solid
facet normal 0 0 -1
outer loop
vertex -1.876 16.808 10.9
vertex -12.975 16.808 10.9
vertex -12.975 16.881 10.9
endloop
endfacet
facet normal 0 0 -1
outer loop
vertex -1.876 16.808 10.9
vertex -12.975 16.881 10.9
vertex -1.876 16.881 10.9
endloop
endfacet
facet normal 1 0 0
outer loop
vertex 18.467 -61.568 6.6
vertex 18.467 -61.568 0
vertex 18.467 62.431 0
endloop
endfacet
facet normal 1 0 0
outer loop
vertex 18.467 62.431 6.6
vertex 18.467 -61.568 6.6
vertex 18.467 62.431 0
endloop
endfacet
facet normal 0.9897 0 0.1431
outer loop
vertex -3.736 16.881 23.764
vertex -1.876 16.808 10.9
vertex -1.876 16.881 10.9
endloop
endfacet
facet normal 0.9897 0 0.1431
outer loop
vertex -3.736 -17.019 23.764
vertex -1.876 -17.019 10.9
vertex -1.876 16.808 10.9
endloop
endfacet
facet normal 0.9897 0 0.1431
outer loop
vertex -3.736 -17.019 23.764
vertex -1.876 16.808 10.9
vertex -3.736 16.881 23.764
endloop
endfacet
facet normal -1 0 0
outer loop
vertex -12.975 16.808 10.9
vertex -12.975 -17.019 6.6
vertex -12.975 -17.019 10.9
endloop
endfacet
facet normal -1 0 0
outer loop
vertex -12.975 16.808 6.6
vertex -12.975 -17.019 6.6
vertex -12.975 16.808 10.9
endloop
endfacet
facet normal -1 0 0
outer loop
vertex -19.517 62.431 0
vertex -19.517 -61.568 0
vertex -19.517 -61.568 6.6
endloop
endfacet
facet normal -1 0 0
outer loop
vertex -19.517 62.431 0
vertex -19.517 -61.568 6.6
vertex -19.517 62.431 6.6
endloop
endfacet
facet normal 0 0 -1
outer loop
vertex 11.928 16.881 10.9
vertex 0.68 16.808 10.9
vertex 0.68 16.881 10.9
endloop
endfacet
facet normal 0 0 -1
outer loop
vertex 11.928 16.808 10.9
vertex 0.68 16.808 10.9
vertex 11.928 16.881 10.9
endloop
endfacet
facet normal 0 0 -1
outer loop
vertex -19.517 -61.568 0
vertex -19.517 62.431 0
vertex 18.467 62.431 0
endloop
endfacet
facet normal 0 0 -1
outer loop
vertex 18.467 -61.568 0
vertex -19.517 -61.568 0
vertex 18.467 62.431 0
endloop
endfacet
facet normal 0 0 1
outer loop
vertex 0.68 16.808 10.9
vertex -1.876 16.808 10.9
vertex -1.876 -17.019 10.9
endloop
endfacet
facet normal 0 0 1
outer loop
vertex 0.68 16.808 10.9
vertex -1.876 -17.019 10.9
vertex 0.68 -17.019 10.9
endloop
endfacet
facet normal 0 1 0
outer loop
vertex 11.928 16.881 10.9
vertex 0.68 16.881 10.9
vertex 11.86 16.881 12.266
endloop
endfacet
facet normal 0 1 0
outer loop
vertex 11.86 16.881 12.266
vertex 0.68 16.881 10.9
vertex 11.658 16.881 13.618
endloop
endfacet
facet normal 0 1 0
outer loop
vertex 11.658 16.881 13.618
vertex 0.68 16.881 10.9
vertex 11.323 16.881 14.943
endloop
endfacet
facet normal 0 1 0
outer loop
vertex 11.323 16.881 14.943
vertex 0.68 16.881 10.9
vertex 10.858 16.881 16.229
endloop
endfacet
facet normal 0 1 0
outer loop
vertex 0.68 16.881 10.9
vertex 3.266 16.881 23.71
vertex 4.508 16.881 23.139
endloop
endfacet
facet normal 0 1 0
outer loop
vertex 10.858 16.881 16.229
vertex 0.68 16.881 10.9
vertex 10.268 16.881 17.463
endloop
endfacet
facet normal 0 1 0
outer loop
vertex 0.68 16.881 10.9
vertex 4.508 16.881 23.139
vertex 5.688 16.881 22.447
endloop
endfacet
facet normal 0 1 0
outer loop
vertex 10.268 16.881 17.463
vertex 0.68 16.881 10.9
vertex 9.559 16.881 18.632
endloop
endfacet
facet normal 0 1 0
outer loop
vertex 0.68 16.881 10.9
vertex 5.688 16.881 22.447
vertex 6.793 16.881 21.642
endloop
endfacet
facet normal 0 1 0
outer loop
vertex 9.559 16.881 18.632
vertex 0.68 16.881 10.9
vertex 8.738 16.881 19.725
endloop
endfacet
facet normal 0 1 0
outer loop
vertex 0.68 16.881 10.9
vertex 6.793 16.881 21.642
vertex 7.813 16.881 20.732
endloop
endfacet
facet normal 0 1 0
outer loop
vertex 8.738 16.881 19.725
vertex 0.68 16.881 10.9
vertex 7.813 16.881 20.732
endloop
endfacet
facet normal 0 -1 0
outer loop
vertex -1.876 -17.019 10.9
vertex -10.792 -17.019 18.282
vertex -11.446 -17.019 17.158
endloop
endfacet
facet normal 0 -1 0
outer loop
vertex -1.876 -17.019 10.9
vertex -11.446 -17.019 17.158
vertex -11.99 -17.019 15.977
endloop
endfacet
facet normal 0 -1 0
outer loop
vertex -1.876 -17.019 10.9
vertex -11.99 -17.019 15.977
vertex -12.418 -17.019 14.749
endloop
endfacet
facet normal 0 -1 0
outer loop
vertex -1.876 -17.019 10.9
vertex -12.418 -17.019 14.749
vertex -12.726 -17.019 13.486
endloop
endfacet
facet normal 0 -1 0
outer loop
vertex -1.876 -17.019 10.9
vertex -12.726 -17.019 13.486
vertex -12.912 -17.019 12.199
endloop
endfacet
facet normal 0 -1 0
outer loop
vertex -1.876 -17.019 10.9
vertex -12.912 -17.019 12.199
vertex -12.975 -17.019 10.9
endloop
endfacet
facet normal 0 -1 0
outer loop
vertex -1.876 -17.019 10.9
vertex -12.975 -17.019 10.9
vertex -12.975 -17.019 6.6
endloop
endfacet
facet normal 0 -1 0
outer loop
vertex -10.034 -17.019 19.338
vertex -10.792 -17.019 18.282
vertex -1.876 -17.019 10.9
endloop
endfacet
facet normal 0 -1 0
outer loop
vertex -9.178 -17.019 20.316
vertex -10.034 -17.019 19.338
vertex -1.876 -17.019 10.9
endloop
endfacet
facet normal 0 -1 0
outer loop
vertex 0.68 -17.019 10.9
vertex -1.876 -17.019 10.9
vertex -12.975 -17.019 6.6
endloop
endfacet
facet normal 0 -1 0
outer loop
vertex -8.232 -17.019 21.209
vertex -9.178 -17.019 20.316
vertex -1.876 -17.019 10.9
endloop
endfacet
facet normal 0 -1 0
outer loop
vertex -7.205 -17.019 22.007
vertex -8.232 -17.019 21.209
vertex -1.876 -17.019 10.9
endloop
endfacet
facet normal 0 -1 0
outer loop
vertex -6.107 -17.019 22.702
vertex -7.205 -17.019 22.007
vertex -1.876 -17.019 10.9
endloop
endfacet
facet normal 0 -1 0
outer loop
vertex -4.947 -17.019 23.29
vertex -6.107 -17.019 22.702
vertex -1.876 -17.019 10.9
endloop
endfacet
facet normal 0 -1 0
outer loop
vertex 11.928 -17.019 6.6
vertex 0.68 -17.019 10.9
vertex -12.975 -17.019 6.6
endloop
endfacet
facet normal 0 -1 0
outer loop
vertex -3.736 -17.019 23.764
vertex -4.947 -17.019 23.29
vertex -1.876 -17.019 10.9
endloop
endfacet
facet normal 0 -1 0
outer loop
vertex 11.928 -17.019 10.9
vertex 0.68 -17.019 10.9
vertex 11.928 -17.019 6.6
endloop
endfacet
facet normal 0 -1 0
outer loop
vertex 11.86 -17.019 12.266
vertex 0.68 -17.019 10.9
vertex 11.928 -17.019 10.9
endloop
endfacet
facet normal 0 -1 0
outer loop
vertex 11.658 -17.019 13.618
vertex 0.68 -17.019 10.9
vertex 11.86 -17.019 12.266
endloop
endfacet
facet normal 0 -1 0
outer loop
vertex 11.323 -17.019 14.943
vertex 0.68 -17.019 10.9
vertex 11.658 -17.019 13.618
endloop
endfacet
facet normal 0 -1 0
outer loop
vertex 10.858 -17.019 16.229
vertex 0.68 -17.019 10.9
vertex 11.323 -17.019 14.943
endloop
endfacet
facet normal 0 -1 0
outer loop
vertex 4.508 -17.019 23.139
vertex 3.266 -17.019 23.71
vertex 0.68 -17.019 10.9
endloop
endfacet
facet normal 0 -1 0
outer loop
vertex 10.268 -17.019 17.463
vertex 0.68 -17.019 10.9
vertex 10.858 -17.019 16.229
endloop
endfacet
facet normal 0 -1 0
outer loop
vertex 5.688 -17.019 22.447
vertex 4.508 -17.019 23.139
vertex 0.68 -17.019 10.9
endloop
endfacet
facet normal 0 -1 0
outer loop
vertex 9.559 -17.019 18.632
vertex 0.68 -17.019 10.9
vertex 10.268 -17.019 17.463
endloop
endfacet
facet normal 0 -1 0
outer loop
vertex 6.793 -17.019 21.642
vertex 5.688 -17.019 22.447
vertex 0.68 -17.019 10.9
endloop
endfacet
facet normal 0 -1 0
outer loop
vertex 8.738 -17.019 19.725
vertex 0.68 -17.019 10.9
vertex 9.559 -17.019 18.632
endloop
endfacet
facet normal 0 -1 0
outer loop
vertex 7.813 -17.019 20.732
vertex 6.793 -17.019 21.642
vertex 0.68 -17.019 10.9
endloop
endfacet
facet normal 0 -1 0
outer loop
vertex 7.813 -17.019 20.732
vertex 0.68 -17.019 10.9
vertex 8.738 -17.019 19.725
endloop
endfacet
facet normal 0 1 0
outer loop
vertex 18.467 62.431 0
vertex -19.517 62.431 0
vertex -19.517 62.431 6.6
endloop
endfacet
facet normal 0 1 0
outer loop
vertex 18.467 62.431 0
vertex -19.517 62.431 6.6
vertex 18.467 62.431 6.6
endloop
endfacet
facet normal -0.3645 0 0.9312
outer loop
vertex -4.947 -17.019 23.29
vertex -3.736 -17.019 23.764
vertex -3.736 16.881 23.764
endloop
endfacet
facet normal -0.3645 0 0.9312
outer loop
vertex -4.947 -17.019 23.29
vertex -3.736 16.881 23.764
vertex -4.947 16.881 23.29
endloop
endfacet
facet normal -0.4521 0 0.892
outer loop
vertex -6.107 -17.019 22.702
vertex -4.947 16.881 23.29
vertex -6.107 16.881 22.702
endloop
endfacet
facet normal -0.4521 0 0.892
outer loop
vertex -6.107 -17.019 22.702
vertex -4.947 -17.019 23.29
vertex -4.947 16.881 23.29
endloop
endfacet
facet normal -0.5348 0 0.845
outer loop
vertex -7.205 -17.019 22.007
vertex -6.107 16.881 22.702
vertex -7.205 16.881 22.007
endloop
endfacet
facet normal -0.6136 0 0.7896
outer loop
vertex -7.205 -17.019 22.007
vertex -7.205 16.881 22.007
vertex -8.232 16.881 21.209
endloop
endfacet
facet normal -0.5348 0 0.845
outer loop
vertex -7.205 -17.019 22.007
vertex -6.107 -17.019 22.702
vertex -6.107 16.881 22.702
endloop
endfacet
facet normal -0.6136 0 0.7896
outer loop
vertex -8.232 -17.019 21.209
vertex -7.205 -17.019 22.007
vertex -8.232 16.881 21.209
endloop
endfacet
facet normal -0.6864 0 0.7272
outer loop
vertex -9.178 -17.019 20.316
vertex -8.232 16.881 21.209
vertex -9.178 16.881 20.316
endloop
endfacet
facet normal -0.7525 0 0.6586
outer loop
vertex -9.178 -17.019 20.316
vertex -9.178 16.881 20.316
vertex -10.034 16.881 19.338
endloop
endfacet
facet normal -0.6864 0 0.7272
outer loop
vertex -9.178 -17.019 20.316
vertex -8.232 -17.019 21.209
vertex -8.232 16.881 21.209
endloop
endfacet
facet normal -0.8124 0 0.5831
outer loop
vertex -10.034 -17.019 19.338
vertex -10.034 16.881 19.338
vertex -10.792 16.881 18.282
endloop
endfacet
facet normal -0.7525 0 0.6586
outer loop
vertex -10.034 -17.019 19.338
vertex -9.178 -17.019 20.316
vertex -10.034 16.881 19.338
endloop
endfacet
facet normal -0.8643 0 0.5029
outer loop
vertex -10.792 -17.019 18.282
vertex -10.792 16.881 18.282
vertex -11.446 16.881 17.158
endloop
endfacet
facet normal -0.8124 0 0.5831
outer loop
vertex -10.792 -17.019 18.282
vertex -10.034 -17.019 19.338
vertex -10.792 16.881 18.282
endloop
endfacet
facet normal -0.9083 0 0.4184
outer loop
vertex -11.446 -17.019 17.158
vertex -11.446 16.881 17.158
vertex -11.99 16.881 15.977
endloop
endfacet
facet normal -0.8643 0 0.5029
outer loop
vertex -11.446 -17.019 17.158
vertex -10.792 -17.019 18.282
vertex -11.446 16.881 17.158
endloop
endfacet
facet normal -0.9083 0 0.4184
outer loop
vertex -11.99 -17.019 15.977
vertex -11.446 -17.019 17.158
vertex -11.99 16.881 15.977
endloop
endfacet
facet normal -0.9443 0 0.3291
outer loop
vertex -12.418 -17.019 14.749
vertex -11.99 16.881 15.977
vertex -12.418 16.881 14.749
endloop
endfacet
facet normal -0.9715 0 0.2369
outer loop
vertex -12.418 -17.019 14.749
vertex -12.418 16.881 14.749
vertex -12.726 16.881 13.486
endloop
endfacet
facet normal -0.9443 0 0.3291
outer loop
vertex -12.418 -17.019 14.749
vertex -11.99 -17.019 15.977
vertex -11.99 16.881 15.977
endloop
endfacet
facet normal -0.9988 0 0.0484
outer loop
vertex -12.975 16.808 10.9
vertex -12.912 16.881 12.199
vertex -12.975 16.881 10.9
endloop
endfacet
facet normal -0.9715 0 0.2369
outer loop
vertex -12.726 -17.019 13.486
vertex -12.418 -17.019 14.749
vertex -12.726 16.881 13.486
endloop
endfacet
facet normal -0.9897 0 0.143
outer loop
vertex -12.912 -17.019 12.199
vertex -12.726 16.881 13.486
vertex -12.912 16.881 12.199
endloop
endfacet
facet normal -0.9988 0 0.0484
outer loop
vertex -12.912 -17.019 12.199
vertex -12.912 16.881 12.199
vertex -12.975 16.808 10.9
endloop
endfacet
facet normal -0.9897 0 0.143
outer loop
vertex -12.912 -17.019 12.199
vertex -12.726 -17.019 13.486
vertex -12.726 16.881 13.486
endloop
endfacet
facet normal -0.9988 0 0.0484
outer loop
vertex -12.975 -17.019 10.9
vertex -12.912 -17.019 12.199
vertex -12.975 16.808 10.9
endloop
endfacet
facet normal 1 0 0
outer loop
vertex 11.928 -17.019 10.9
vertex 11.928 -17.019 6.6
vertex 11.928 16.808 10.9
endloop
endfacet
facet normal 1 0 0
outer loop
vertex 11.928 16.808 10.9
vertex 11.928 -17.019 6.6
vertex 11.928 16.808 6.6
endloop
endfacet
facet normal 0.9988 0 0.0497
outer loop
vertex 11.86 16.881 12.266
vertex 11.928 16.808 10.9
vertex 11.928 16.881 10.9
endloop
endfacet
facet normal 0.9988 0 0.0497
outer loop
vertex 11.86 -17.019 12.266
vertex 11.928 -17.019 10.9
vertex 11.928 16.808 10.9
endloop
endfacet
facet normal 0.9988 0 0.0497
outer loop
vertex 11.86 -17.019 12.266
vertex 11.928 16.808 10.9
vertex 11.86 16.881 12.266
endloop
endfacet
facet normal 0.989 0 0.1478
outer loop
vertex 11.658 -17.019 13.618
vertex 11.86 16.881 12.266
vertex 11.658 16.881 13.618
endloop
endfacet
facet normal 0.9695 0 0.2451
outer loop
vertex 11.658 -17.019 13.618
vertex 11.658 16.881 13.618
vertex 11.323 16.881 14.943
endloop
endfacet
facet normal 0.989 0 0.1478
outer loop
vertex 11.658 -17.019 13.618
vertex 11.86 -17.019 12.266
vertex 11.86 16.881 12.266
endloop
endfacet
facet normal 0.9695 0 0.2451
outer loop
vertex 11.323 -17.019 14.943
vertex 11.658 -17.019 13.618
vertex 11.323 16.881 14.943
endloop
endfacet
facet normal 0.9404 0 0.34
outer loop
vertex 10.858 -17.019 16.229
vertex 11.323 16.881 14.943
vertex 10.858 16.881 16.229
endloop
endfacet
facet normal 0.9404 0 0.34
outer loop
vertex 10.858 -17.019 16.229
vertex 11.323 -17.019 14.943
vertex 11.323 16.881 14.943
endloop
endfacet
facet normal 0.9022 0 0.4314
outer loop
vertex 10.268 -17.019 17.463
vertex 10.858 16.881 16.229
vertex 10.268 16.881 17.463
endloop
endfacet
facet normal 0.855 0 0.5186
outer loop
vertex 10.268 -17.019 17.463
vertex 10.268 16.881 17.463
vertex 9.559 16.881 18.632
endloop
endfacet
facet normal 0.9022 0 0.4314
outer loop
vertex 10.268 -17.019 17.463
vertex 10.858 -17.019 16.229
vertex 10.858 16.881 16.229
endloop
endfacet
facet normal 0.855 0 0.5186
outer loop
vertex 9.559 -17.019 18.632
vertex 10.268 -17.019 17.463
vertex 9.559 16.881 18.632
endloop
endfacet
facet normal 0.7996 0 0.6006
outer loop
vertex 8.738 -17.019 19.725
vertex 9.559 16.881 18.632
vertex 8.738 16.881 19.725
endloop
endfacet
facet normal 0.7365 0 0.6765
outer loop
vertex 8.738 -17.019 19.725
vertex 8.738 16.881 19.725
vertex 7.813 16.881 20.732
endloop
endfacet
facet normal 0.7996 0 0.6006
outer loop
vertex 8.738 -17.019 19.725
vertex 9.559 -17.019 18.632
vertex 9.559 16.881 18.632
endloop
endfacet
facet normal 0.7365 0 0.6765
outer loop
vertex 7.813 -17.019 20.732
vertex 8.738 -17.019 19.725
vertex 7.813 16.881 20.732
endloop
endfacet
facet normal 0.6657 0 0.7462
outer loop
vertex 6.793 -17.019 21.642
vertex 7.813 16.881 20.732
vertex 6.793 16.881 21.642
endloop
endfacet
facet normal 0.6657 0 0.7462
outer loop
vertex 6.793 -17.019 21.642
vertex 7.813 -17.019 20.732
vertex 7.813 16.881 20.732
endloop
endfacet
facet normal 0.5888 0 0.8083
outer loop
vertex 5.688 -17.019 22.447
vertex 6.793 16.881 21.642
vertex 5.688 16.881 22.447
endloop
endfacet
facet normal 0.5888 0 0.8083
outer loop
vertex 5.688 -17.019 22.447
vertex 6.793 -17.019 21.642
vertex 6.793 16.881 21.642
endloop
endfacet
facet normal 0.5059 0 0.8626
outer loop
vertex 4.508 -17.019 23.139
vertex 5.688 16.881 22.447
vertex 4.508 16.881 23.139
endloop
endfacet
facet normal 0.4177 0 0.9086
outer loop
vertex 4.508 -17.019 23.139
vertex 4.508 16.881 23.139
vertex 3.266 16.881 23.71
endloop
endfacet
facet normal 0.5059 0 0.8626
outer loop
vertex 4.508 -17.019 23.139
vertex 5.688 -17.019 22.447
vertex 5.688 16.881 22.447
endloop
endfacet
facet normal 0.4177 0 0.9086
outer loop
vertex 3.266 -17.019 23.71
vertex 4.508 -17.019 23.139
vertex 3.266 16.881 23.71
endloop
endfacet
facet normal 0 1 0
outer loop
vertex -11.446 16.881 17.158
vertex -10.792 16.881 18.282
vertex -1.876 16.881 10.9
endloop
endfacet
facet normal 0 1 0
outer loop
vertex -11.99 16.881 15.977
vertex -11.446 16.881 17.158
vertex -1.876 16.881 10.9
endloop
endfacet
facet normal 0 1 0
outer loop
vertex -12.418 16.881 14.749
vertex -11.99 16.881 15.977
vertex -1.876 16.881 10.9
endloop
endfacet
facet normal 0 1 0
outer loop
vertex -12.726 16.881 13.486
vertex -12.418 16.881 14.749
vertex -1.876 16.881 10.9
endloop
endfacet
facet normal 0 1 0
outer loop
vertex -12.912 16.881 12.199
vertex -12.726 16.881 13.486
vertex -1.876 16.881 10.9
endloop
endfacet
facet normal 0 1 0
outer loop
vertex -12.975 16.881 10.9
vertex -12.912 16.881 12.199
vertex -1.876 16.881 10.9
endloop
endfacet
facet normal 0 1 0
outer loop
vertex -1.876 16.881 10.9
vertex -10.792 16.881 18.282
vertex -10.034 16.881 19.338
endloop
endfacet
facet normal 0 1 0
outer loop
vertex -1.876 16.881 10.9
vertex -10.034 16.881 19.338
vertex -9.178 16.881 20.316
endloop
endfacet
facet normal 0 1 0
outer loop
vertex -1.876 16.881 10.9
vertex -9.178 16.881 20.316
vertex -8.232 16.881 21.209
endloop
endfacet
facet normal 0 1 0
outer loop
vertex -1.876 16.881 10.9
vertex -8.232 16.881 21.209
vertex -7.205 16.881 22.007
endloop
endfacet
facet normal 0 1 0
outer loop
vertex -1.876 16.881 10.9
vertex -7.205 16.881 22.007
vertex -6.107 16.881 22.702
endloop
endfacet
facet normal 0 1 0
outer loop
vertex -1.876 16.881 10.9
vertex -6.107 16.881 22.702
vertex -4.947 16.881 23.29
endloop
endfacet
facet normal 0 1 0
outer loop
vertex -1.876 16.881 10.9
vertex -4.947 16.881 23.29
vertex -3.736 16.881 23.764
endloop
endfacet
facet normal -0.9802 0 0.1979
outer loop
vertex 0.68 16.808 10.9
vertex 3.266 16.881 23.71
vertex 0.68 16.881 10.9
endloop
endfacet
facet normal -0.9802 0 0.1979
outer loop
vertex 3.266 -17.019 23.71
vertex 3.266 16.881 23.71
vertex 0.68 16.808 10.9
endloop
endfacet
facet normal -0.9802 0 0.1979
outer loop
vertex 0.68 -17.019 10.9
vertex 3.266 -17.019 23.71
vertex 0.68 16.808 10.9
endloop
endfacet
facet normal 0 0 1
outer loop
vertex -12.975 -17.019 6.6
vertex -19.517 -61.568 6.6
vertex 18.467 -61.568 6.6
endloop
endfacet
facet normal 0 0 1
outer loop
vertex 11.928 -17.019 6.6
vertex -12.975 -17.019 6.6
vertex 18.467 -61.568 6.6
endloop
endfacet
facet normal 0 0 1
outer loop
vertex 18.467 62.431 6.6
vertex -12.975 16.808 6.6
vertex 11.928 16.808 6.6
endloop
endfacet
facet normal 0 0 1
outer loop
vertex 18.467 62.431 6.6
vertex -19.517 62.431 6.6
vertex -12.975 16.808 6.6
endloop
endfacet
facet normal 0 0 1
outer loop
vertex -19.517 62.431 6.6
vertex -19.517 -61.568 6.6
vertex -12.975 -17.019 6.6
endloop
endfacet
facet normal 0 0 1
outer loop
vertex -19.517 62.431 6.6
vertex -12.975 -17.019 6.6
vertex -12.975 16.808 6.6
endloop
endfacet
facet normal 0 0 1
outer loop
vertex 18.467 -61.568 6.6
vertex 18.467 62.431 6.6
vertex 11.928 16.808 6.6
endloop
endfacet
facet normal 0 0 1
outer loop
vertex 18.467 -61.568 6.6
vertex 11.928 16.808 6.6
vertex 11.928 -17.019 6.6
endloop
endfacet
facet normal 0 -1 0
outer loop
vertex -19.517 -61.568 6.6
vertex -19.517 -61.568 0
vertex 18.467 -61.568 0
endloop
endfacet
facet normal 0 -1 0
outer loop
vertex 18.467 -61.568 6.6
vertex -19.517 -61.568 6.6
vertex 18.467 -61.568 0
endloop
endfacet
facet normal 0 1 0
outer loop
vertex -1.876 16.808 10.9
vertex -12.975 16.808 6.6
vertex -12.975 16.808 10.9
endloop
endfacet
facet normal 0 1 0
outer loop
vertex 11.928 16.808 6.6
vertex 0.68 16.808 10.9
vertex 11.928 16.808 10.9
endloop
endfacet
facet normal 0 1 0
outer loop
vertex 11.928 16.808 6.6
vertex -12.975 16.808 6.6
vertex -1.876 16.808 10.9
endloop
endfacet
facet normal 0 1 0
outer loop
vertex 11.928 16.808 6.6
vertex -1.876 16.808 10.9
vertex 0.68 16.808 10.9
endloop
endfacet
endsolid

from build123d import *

# Parameters (mm, degrees)
F0_W     = 37.984425202
F0_H     = 123.9991616458
F0_W_2   = 24.9025691301
F0_H_2   = 33.8271874934
F1_DEPTH = 6.6
F2_DEPTH = 10.9
F4_DEPTH = 33.9


with BuildPart() as f1:
    # F0 (on Top) → F1 (new body)
    with BuildSketch(Plane.XY):
        with Locations((-0.5247322842, 0.4318514839)):
            Rectangle(F0_W, F0_H)
        with Locations((-0.5233194679, -0.1052441075)):
            Rectangle(F0_W_2, F0_H_2, mode=Mode.SUBTRACT)
    extrude(amount=F1_DEPTH)

    # F0 (on Top) → F2 (join)
    with BuildSketch(Plane.XY):
        with Locations((-0.5233194679, -0.1052441075)):
            Rectangle(F0_W_2, F0_H_2)
    extrude(amount=F2_DEPTH)

    # F3 (on face) → F4 (join)
    with BuildSketch(Plane.XZ.offset(17.0188378543)):
        with BuildLine():
            Line((3.2664190512, 23.7103309482), (0.6797150322, 10.9))
            Line((0.6797150322, 10.9), (11.9279650971, 10.9))
            ThreePointArc((11.9279650971, 10.9), (9.5593663419, 18.6318652166), (3.2664190512, 23.7103309482))
        make_face()
        with BuildLine():
            Line((-1.8759769267, 10.9), (-3.7359872367, 23.7637832761))
            ThreePointArc((-3.7359872367, 23.7637832761), (-10.4256426154, 18.8187903193), (-12.9746040329, 10.9))
            Line((-12.9746040329, 10.9), (-1.8759769267, 10.9))
        make_face()
    extrude(amount=-F4_DEPTH)


solid = f1.part
